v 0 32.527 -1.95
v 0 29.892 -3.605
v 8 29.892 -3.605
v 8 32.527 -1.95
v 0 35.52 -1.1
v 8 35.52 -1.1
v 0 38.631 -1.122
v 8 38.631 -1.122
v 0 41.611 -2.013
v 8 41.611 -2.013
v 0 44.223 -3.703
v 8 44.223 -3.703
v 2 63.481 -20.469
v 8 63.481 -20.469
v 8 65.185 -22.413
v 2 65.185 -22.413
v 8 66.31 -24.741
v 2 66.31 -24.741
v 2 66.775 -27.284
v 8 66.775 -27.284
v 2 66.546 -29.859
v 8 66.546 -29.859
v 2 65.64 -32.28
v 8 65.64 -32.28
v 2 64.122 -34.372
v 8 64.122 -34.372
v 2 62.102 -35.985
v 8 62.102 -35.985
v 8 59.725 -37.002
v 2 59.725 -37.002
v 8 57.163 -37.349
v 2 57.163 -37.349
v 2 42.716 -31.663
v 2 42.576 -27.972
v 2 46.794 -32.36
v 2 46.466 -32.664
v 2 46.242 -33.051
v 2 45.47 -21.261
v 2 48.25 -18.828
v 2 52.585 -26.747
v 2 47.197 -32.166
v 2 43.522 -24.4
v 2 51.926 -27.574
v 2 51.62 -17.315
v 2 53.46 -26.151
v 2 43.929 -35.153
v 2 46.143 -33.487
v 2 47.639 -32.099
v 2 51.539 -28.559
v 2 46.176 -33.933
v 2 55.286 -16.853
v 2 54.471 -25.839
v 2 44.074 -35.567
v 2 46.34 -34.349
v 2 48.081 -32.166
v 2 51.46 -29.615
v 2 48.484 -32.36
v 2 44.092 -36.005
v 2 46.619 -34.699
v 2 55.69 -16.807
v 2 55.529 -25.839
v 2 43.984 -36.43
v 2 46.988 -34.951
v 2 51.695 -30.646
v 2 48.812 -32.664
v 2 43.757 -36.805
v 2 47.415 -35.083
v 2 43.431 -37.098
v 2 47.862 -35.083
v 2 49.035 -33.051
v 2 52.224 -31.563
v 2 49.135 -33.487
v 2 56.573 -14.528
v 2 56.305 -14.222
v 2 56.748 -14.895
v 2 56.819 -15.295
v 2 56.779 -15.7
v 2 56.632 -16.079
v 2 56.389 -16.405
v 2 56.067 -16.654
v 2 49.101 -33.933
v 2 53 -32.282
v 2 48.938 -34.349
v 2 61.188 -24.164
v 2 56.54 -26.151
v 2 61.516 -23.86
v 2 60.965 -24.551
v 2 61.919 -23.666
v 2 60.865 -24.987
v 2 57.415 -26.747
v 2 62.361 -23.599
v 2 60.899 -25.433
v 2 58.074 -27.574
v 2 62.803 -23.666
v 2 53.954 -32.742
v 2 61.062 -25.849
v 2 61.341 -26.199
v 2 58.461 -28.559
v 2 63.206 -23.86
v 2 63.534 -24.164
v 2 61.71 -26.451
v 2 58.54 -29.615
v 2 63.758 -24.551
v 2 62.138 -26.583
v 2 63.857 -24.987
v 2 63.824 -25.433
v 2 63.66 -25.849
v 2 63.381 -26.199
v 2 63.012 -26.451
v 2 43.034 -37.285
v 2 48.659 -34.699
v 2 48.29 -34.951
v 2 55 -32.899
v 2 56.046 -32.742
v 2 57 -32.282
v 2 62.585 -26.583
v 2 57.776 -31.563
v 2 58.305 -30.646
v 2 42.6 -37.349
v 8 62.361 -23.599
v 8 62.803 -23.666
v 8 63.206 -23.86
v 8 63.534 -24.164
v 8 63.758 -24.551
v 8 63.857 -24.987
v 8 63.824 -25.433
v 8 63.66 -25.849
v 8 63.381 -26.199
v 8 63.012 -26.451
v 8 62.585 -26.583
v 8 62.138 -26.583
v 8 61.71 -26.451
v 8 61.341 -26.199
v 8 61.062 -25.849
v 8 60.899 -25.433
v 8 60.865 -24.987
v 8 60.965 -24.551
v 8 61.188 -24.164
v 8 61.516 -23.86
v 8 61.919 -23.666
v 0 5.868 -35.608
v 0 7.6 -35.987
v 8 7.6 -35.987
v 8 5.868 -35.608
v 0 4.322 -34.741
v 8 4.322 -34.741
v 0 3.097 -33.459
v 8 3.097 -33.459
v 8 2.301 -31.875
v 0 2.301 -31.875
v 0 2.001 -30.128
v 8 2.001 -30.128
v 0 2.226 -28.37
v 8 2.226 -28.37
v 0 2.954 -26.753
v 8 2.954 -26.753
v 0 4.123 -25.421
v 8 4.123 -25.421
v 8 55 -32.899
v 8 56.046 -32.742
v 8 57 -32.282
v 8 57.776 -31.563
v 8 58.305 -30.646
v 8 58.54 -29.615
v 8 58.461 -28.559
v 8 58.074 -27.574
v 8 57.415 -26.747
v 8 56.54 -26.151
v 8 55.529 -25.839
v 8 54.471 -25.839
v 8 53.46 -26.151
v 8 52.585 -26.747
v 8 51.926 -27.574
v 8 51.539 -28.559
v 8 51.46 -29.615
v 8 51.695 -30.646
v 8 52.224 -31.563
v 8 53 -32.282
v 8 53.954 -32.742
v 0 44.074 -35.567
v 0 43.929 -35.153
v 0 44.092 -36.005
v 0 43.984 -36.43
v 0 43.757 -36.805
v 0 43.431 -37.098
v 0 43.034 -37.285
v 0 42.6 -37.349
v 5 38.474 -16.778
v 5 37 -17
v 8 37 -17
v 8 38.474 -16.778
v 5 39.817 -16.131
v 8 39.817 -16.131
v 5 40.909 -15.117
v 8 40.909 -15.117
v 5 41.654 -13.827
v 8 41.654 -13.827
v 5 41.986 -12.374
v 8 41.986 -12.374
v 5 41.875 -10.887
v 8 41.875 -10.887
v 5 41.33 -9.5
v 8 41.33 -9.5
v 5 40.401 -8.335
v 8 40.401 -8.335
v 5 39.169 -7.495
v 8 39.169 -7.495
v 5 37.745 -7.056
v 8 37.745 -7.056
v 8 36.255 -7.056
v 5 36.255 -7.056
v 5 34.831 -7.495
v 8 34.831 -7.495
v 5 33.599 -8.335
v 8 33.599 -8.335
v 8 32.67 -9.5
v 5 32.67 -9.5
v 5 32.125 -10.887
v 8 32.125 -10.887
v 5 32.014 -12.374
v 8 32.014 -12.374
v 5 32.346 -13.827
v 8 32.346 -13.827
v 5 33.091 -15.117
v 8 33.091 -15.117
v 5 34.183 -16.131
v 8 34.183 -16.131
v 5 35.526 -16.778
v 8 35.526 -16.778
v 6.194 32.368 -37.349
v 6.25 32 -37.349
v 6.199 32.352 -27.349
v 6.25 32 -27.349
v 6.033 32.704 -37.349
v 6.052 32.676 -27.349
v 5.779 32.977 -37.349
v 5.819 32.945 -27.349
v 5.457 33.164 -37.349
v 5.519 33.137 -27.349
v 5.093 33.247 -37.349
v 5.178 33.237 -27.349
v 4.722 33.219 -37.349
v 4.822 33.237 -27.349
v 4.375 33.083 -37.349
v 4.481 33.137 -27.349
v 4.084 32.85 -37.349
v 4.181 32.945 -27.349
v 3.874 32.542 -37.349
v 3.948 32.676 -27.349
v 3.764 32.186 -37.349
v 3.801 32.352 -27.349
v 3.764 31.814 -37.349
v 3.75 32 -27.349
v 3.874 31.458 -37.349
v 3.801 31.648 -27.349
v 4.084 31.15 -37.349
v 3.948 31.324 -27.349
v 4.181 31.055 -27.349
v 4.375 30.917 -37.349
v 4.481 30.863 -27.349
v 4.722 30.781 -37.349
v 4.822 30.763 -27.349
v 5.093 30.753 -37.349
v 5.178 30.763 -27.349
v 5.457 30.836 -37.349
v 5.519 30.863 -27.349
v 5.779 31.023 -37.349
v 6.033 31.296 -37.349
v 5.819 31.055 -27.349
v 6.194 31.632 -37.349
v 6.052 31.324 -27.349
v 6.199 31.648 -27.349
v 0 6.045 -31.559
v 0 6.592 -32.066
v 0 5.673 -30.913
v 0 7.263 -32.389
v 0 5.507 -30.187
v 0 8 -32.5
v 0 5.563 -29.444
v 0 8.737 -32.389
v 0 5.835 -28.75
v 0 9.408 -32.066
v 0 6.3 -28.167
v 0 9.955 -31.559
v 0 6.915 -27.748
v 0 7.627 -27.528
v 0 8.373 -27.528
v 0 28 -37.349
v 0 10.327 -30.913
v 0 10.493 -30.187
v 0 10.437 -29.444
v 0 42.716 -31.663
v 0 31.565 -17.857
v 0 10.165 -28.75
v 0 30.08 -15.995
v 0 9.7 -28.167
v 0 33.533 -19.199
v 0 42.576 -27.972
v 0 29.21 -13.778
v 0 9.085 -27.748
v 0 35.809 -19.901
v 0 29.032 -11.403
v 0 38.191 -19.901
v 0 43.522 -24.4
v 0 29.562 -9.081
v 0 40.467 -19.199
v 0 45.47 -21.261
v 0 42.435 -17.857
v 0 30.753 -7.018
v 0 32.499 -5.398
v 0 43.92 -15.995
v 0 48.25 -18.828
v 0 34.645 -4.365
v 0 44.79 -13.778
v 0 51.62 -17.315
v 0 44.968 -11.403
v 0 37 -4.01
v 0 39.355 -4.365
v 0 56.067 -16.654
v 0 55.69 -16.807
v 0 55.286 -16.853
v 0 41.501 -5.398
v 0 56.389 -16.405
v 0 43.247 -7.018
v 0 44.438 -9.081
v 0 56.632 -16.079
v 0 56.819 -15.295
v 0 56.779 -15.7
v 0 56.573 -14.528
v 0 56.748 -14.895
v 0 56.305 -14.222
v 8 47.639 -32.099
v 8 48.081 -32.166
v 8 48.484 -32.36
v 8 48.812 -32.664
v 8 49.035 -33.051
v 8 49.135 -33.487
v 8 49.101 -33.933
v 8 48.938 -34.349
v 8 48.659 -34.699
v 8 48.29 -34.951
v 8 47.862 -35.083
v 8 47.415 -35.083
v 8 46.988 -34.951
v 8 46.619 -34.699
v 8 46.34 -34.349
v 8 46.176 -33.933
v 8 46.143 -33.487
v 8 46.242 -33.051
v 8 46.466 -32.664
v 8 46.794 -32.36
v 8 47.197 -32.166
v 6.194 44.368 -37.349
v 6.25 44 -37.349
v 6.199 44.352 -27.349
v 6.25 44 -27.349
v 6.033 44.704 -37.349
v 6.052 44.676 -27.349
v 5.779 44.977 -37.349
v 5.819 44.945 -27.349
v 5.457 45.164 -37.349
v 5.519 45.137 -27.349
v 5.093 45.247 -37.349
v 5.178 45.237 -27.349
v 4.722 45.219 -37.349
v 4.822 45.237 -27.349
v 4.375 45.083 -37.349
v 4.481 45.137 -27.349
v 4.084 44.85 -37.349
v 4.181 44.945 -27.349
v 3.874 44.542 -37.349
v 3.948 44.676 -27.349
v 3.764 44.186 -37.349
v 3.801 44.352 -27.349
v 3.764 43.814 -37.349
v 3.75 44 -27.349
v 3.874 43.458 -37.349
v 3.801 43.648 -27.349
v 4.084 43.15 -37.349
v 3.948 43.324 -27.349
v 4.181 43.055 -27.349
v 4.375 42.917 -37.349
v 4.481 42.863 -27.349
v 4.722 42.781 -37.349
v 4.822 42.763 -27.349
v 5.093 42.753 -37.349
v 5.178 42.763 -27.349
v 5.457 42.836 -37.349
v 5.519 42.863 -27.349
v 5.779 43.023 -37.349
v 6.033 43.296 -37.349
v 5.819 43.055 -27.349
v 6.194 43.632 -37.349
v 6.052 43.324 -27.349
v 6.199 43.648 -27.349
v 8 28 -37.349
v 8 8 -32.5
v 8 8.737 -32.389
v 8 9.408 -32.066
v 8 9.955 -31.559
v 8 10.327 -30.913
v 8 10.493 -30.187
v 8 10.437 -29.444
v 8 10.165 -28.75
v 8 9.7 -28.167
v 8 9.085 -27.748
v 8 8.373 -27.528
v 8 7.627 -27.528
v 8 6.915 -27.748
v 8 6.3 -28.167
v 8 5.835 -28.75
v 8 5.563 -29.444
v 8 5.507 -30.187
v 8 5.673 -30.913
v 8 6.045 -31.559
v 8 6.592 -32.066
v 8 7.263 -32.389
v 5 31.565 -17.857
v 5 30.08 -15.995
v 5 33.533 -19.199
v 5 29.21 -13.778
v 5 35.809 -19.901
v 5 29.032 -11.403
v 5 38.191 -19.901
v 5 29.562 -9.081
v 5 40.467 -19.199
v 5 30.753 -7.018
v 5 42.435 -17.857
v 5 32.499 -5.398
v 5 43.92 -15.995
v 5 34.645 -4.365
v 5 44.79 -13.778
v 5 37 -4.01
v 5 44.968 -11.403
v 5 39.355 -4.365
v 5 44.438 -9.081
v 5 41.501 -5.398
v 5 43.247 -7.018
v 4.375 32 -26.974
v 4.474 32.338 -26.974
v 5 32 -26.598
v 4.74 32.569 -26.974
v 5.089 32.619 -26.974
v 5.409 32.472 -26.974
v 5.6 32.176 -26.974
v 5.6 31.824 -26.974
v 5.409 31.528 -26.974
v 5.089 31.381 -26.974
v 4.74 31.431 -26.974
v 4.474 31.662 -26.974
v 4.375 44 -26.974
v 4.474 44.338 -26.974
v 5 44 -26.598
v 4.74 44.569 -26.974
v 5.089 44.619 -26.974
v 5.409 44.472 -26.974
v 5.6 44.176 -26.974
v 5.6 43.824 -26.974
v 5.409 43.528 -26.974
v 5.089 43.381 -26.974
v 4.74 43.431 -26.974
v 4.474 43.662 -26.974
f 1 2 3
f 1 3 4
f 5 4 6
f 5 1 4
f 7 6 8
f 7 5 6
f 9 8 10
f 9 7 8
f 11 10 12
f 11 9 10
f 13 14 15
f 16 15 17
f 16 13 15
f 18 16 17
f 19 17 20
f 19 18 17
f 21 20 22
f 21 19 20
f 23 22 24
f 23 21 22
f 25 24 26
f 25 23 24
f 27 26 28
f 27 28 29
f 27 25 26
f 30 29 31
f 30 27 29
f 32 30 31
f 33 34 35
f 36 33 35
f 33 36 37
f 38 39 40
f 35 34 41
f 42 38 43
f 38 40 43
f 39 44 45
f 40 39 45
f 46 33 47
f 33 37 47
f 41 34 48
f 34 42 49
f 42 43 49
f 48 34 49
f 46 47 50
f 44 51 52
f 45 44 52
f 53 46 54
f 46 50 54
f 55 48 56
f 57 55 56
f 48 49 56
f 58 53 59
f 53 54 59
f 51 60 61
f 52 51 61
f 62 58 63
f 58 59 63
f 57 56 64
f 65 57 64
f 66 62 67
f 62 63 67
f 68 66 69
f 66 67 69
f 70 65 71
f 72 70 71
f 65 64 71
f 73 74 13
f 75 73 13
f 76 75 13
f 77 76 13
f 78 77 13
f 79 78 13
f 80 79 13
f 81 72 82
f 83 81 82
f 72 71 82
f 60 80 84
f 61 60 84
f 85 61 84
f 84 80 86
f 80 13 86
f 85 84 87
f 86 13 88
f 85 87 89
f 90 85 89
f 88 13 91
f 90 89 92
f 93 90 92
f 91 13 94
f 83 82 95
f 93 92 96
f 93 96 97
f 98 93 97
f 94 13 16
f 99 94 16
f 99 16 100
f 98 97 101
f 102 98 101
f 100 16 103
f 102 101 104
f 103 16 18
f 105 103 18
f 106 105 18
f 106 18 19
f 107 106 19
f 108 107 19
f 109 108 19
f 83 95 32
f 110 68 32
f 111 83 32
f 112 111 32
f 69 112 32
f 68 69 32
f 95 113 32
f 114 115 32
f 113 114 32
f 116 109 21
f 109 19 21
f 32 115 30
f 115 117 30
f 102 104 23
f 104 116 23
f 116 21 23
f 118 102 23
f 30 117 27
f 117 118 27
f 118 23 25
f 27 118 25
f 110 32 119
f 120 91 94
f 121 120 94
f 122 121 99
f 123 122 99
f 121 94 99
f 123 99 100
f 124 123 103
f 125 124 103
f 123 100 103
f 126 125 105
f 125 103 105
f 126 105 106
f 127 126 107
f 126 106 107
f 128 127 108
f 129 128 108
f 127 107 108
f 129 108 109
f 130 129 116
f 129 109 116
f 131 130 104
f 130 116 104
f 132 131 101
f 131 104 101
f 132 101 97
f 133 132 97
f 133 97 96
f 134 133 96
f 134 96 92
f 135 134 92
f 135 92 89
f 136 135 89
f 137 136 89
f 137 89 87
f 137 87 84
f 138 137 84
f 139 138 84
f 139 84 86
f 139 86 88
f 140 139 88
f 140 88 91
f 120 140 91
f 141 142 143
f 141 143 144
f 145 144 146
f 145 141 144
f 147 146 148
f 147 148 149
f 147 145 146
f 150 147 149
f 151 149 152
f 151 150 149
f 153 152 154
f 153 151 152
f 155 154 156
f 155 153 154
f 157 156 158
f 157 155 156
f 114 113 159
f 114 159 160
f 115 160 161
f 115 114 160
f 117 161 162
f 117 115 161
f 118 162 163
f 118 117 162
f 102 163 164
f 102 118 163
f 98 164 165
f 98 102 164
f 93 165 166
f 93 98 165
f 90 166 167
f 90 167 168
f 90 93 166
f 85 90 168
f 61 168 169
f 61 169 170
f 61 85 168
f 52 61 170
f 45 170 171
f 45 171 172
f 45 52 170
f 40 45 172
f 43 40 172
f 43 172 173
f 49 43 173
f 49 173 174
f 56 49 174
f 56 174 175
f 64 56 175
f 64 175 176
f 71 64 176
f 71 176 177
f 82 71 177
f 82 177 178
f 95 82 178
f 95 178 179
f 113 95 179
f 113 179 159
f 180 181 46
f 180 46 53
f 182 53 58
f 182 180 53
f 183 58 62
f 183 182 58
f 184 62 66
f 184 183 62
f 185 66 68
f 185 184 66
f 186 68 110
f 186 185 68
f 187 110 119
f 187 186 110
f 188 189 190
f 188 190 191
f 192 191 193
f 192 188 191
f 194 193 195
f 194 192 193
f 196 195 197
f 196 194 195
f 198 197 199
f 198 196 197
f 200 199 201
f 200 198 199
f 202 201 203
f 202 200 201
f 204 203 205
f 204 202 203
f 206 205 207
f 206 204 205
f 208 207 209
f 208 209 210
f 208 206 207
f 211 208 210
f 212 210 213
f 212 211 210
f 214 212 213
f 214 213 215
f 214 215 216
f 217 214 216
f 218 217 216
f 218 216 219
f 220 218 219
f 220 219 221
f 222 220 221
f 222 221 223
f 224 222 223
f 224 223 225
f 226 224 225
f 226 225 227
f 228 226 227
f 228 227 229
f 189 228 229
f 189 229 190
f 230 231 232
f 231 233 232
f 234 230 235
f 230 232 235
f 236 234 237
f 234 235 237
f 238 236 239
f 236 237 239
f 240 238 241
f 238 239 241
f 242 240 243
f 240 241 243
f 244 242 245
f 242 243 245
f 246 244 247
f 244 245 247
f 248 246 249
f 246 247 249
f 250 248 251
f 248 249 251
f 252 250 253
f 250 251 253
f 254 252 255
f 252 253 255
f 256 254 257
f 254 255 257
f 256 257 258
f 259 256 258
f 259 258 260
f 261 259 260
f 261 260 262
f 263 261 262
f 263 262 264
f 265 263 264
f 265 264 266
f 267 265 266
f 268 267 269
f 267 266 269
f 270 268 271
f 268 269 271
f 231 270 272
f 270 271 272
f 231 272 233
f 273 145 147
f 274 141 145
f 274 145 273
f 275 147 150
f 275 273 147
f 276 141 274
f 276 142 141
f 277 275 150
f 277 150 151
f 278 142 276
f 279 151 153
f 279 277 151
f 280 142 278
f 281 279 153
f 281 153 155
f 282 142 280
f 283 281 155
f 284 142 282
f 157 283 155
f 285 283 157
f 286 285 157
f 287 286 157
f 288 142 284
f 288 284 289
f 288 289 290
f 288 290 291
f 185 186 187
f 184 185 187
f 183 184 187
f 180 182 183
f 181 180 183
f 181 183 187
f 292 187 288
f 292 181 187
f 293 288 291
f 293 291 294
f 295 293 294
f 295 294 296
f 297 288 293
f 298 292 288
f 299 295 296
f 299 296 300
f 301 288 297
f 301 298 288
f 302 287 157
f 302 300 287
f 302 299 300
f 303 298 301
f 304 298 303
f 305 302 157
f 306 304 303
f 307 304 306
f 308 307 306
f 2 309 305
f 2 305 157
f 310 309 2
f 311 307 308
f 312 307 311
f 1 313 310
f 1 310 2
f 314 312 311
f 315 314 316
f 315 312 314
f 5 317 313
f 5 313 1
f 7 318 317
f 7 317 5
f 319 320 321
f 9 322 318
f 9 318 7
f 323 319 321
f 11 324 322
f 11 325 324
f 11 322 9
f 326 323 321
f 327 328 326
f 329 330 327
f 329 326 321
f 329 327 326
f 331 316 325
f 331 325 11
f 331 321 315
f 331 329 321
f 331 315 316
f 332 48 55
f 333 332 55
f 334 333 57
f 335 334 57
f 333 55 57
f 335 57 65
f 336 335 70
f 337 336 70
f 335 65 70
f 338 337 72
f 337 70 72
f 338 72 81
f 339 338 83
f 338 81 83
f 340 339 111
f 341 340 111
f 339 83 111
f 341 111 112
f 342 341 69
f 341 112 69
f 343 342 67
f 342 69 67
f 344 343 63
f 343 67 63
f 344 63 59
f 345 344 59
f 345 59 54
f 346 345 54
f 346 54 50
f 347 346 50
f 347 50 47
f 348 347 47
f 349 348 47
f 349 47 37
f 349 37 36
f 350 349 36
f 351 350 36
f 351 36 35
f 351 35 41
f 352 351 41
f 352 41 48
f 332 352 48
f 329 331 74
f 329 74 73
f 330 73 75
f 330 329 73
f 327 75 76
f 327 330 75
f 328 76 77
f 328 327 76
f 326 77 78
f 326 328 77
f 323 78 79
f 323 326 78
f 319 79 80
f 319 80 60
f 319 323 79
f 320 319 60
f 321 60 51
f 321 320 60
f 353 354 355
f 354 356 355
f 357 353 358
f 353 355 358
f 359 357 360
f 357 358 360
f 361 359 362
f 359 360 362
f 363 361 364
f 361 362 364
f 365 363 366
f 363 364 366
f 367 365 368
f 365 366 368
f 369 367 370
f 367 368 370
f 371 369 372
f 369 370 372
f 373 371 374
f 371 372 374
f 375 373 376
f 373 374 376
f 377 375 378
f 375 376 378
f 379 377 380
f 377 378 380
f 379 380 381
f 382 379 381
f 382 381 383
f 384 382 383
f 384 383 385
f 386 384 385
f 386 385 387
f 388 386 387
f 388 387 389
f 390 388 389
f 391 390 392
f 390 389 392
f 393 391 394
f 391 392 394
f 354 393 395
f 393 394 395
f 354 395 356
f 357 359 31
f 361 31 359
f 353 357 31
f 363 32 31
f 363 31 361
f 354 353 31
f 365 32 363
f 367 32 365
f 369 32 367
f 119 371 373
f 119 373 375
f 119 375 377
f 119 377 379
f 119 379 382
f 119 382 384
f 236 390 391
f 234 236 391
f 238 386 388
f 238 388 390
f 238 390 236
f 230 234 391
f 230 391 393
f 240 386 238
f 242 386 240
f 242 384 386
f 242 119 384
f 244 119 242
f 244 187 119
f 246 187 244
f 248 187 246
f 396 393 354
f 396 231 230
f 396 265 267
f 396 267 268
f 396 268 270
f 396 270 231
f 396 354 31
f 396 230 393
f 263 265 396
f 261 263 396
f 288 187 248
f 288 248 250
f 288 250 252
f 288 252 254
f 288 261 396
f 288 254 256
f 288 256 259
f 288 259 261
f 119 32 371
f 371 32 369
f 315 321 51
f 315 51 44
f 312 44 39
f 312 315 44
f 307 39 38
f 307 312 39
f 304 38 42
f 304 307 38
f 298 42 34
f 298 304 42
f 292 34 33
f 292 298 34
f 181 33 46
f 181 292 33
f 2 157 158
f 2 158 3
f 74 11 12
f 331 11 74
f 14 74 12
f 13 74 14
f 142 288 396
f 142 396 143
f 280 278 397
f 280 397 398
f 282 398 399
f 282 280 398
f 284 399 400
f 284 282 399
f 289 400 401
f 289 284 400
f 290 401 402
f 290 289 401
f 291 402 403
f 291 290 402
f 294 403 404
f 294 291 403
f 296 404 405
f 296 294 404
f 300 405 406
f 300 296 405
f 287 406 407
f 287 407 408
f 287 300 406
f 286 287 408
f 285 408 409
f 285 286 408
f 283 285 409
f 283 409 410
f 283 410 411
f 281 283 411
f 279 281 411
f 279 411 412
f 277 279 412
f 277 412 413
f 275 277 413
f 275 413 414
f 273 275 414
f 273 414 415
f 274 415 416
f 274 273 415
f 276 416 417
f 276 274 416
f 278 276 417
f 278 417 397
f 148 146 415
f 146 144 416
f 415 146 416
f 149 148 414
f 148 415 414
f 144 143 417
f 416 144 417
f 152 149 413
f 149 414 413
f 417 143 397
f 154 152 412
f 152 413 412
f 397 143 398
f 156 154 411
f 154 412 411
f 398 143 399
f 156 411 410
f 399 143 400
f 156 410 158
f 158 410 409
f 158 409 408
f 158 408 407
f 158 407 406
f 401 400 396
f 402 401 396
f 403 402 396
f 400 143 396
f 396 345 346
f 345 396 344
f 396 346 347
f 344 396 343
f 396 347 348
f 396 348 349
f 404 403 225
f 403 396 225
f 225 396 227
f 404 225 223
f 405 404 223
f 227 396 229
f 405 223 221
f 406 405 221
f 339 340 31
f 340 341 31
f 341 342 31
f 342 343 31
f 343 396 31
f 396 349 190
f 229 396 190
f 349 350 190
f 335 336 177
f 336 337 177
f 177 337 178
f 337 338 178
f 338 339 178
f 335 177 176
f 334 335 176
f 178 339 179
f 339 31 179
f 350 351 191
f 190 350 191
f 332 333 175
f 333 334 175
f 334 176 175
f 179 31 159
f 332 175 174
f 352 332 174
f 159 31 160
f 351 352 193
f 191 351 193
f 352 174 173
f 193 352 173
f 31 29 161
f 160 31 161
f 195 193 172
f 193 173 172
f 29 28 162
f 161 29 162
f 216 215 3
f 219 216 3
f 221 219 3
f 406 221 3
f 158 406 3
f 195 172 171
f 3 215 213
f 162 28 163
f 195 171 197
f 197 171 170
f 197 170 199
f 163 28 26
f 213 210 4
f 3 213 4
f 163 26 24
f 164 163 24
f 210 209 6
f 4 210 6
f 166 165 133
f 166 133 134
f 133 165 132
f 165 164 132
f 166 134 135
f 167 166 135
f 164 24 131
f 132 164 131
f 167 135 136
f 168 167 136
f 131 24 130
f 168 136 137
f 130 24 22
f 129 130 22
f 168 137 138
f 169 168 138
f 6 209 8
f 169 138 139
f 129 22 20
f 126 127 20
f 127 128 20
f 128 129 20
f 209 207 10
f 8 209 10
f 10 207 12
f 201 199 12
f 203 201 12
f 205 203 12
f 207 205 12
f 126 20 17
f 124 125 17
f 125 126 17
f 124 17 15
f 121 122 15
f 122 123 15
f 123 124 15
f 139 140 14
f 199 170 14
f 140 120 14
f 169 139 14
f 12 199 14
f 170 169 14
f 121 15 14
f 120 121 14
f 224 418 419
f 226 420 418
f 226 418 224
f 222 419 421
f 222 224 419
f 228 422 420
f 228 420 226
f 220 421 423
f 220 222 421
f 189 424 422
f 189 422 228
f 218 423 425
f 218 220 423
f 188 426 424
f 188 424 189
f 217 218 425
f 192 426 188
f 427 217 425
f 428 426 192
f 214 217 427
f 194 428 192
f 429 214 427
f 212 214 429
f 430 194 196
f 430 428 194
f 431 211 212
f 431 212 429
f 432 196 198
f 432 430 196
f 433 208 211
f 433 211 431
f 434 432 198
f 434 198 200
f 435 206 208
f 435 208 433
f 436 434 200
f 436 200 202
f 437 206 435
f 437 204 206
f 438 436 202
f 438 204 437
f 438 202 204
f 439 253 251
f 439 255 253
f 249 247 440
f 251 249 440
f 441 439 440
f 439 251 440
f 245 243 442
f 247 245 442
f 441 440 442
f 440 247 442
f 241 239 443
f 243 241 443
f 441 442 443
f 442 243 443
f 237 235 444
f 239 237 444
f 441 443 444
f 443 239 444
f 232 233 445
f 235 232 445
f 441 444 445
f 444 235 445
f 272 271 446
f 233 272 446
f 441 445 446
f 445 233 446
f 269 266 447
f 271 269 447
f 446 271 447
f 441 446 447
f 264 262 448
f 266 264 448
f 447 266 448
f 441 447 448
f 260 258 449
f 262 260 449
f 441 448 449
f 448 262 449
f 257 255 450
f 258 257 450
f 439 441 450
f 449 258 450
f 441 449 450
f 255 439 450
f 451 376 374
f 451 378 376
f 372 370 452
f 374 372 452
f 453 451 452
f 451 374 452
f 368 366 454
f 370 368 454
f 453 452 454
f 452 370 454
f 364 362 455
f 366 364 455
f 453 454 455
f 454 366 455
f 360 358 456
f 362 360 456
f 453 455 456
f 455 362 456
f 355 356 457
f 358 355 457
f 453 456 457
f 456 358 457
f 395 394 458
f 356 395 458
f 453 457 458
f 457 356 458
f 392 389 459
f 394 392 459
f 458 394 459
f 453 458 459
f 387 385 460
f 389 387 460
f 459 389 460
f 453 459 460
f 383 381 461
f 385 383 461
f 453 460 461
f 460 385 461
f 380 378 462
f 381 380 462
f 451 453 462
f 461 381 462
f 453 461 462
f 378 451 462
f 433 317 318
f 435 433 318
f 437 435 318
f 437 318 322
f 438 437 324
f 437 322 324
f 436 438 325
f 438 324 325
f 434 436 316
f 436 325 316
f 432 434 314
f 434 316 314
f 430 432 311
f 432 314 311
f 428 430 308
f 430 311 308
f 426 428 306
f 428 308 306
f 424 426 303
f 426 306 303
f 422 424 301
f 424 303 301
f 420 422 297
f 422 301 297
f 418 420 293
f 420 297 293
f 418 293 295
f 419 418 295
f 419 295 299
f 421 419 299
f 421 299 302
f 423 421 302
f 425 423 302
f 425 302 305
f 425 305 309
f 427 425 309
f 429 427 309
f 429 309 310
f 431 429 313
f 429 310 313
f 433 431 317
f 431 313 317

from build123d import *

# Parameters (mm, degrees)
SKETCH27_R                  = 3.55
SKETCH27_R_2                = 5
SKETCH27_R_3                = 2.5
BOSS_EXTRUDE1_DEPTH         = 8
TAP_DRILL_FOR_M3_TAP2_D     = 2.5
TAP_DRILL_FOR_M3_TAP2_DEPTH = 10
TAP_DRILL_FOR_M3_TAP2_TIP   = 0.751075774
SKETCH47_R                  = 7.99
CUT_EXTRUDE8_DEPTH          = 5
CUT_EXTRUDE10_DEPTH         = 2
CUT_EXTRUDE11_REACH         = 78.755
SKETCH49_R                  = 1.5


with BuildPart() as part:
    # Sketch27 → Boss-Extrude1 (new body)
    with BuildSketch(Plane(origin=(0, 0, 0), x_dir=(0, 0, -1), z_dir=(1, 0, 0))):
        with BuildLine():
            Line((3.703427373, 44.222664512), (20.469158548, 63.481222917))
            ThreePointArc((20.469158548, 63.481222917), (31.099959488, 66.174951681), (37.349351573, 57.163003953))
            Line((37.349351573, 57.163003953), (37.349351573, 28))
            Line((37.349351573, 28), (35.98665831, 7.600097167))
            ThreePointArc((35.98665831, 7.600097167), (31.875470614, 2.300648285), (25.420672816, 4.12317623))
            Line((25.420672816, 4.12317623), (3.604566829, 29.892489756))
            ThreePointArc((3.604566829, 29.892489756), (1.000261752, 37.075884637), (3.703427373, 44.222664512))
        make_face()
        with Locations((29.349351573, 55)):
            Circle(SKETCH27_R, mode=Mode.SUBTRACT)
        with Locations((12, 37)):
            Circle(SKETCH27_R_2, mode=Mode.SUBTRACT)
        with Locations((30, 8)):
            Circle(SKETCH27_R_3, mode=Mode.SUBTRACT)
    extrude(amount=BOSS_EXTRUDE1_DEPTH)

    # Tap Drill for M3 Tap2
    with Locations(Plane(origin=(0, 0, -37.349351573), x_dir=(-1, 0, 0), z_dir=(0, 0, -1))):
        with Locations((-5, 44), (-5, 32)):
            Hole(TAP_DRILL_FOR_M3_TAP2_D / 2, depth=TAP_DRILL_FOR_M3_TAP2_DEPTH)
            with Locations((0, 0, -(TAP_DRILL_FOR_M3_TAP2_DEPTH + TAP_DRILL_FOR_M3_TAP2_TIP / 2))):  # 118° drill point
                Cone(0, TAP_DRILL_FOR_M3_TAP2_D / 2, TAP_DRILL_FOR_M3_TAP2_TIP, mode=Mode.SUBTRACT)

    # Sketch47 → Cut-Extrude8 (cut)
    with BuildSketch(Plane.ZY):
        with Locations((-12, 37)):
            Circle(SKETCH47_R)
    extrude(amount=-CUT_EXTRUDE8_DEPTH, mode=Mode.SUBTRACT)

    # Sketch48 → Cut-Extrude10 (cut)
    with BuildSketch(Plane.ZY):
        with BuildLine():
            Line((-37.349351573, 42.600403232), (-37.349351573, 72.646655563))
            Line((-37.349351573, 72.646655563), (-14.22165601, 72.646655563))
            Line((-14.22165601, 72.646655563), (-14.22165601, 56.304805064))
            ThreePointArc((-14.22165601, 56.304805064), (-15.894843611, 56.718614571), (-16.852615188, 55.285621667))
            ThreePointArc((-16.852615188, 55.285621667), (-22.758204677, 44.378946258), (-35.152923001, 43.928931457))
            ThreePointArc((-35.152923001, 43.928931457), (-36.625675327, 43.883883434), (-37.349351573, 42.600403232))
        make_face()
    extrude(amount=-CUT_EXTRUDE10_DEPTH, mode=Mode.SUBTRACT)

    # Sketch49 → Cut-Extrude11 (cut, up to next)
    with BuildSketch(Plane.ZY.offset(-2), mode=Mode.PRIVATE) as cut_extrude11_sk1:
        with Locations((-33.599351573, 47.638784068)):
            Circle(SKETCH49_R)
    cut_extrude11_tool1 = extrude(cut_extrude11_sk1.sketch, amount=-CUT_EXTRUDE11_REACH, mode=Mode.PRIVATE) & part.part
    # Sketch49 → Cut-Extrude11 (cut, up to next)
    with BuildSketch(Plane.ZY.offset(-2), mode=Mode.PRIVATE) as cut_extrude11_sk2:
        with Locations((-25.099351573, 62.361215932)):
            Circle(SKETCH49_R)
    cut_extrude11_tool2 = extrude(cut_extrude11_sk2.sketch, amount=-CUT_EXTRUDE11_REACH, mode=Mode.PRIVATE) & part.part
    add(cut_extrude11_tool1.solids().sort_by_distance((2, 47.638784, -33.599352))[0], mode=Mode.SUBTRACT)
    add(cut_extrude11_tool2.solids().sort_by_distance((2, 62.361216, -25.099352))[0], mode=Mode.SUBTRACT)


solid = part.part
